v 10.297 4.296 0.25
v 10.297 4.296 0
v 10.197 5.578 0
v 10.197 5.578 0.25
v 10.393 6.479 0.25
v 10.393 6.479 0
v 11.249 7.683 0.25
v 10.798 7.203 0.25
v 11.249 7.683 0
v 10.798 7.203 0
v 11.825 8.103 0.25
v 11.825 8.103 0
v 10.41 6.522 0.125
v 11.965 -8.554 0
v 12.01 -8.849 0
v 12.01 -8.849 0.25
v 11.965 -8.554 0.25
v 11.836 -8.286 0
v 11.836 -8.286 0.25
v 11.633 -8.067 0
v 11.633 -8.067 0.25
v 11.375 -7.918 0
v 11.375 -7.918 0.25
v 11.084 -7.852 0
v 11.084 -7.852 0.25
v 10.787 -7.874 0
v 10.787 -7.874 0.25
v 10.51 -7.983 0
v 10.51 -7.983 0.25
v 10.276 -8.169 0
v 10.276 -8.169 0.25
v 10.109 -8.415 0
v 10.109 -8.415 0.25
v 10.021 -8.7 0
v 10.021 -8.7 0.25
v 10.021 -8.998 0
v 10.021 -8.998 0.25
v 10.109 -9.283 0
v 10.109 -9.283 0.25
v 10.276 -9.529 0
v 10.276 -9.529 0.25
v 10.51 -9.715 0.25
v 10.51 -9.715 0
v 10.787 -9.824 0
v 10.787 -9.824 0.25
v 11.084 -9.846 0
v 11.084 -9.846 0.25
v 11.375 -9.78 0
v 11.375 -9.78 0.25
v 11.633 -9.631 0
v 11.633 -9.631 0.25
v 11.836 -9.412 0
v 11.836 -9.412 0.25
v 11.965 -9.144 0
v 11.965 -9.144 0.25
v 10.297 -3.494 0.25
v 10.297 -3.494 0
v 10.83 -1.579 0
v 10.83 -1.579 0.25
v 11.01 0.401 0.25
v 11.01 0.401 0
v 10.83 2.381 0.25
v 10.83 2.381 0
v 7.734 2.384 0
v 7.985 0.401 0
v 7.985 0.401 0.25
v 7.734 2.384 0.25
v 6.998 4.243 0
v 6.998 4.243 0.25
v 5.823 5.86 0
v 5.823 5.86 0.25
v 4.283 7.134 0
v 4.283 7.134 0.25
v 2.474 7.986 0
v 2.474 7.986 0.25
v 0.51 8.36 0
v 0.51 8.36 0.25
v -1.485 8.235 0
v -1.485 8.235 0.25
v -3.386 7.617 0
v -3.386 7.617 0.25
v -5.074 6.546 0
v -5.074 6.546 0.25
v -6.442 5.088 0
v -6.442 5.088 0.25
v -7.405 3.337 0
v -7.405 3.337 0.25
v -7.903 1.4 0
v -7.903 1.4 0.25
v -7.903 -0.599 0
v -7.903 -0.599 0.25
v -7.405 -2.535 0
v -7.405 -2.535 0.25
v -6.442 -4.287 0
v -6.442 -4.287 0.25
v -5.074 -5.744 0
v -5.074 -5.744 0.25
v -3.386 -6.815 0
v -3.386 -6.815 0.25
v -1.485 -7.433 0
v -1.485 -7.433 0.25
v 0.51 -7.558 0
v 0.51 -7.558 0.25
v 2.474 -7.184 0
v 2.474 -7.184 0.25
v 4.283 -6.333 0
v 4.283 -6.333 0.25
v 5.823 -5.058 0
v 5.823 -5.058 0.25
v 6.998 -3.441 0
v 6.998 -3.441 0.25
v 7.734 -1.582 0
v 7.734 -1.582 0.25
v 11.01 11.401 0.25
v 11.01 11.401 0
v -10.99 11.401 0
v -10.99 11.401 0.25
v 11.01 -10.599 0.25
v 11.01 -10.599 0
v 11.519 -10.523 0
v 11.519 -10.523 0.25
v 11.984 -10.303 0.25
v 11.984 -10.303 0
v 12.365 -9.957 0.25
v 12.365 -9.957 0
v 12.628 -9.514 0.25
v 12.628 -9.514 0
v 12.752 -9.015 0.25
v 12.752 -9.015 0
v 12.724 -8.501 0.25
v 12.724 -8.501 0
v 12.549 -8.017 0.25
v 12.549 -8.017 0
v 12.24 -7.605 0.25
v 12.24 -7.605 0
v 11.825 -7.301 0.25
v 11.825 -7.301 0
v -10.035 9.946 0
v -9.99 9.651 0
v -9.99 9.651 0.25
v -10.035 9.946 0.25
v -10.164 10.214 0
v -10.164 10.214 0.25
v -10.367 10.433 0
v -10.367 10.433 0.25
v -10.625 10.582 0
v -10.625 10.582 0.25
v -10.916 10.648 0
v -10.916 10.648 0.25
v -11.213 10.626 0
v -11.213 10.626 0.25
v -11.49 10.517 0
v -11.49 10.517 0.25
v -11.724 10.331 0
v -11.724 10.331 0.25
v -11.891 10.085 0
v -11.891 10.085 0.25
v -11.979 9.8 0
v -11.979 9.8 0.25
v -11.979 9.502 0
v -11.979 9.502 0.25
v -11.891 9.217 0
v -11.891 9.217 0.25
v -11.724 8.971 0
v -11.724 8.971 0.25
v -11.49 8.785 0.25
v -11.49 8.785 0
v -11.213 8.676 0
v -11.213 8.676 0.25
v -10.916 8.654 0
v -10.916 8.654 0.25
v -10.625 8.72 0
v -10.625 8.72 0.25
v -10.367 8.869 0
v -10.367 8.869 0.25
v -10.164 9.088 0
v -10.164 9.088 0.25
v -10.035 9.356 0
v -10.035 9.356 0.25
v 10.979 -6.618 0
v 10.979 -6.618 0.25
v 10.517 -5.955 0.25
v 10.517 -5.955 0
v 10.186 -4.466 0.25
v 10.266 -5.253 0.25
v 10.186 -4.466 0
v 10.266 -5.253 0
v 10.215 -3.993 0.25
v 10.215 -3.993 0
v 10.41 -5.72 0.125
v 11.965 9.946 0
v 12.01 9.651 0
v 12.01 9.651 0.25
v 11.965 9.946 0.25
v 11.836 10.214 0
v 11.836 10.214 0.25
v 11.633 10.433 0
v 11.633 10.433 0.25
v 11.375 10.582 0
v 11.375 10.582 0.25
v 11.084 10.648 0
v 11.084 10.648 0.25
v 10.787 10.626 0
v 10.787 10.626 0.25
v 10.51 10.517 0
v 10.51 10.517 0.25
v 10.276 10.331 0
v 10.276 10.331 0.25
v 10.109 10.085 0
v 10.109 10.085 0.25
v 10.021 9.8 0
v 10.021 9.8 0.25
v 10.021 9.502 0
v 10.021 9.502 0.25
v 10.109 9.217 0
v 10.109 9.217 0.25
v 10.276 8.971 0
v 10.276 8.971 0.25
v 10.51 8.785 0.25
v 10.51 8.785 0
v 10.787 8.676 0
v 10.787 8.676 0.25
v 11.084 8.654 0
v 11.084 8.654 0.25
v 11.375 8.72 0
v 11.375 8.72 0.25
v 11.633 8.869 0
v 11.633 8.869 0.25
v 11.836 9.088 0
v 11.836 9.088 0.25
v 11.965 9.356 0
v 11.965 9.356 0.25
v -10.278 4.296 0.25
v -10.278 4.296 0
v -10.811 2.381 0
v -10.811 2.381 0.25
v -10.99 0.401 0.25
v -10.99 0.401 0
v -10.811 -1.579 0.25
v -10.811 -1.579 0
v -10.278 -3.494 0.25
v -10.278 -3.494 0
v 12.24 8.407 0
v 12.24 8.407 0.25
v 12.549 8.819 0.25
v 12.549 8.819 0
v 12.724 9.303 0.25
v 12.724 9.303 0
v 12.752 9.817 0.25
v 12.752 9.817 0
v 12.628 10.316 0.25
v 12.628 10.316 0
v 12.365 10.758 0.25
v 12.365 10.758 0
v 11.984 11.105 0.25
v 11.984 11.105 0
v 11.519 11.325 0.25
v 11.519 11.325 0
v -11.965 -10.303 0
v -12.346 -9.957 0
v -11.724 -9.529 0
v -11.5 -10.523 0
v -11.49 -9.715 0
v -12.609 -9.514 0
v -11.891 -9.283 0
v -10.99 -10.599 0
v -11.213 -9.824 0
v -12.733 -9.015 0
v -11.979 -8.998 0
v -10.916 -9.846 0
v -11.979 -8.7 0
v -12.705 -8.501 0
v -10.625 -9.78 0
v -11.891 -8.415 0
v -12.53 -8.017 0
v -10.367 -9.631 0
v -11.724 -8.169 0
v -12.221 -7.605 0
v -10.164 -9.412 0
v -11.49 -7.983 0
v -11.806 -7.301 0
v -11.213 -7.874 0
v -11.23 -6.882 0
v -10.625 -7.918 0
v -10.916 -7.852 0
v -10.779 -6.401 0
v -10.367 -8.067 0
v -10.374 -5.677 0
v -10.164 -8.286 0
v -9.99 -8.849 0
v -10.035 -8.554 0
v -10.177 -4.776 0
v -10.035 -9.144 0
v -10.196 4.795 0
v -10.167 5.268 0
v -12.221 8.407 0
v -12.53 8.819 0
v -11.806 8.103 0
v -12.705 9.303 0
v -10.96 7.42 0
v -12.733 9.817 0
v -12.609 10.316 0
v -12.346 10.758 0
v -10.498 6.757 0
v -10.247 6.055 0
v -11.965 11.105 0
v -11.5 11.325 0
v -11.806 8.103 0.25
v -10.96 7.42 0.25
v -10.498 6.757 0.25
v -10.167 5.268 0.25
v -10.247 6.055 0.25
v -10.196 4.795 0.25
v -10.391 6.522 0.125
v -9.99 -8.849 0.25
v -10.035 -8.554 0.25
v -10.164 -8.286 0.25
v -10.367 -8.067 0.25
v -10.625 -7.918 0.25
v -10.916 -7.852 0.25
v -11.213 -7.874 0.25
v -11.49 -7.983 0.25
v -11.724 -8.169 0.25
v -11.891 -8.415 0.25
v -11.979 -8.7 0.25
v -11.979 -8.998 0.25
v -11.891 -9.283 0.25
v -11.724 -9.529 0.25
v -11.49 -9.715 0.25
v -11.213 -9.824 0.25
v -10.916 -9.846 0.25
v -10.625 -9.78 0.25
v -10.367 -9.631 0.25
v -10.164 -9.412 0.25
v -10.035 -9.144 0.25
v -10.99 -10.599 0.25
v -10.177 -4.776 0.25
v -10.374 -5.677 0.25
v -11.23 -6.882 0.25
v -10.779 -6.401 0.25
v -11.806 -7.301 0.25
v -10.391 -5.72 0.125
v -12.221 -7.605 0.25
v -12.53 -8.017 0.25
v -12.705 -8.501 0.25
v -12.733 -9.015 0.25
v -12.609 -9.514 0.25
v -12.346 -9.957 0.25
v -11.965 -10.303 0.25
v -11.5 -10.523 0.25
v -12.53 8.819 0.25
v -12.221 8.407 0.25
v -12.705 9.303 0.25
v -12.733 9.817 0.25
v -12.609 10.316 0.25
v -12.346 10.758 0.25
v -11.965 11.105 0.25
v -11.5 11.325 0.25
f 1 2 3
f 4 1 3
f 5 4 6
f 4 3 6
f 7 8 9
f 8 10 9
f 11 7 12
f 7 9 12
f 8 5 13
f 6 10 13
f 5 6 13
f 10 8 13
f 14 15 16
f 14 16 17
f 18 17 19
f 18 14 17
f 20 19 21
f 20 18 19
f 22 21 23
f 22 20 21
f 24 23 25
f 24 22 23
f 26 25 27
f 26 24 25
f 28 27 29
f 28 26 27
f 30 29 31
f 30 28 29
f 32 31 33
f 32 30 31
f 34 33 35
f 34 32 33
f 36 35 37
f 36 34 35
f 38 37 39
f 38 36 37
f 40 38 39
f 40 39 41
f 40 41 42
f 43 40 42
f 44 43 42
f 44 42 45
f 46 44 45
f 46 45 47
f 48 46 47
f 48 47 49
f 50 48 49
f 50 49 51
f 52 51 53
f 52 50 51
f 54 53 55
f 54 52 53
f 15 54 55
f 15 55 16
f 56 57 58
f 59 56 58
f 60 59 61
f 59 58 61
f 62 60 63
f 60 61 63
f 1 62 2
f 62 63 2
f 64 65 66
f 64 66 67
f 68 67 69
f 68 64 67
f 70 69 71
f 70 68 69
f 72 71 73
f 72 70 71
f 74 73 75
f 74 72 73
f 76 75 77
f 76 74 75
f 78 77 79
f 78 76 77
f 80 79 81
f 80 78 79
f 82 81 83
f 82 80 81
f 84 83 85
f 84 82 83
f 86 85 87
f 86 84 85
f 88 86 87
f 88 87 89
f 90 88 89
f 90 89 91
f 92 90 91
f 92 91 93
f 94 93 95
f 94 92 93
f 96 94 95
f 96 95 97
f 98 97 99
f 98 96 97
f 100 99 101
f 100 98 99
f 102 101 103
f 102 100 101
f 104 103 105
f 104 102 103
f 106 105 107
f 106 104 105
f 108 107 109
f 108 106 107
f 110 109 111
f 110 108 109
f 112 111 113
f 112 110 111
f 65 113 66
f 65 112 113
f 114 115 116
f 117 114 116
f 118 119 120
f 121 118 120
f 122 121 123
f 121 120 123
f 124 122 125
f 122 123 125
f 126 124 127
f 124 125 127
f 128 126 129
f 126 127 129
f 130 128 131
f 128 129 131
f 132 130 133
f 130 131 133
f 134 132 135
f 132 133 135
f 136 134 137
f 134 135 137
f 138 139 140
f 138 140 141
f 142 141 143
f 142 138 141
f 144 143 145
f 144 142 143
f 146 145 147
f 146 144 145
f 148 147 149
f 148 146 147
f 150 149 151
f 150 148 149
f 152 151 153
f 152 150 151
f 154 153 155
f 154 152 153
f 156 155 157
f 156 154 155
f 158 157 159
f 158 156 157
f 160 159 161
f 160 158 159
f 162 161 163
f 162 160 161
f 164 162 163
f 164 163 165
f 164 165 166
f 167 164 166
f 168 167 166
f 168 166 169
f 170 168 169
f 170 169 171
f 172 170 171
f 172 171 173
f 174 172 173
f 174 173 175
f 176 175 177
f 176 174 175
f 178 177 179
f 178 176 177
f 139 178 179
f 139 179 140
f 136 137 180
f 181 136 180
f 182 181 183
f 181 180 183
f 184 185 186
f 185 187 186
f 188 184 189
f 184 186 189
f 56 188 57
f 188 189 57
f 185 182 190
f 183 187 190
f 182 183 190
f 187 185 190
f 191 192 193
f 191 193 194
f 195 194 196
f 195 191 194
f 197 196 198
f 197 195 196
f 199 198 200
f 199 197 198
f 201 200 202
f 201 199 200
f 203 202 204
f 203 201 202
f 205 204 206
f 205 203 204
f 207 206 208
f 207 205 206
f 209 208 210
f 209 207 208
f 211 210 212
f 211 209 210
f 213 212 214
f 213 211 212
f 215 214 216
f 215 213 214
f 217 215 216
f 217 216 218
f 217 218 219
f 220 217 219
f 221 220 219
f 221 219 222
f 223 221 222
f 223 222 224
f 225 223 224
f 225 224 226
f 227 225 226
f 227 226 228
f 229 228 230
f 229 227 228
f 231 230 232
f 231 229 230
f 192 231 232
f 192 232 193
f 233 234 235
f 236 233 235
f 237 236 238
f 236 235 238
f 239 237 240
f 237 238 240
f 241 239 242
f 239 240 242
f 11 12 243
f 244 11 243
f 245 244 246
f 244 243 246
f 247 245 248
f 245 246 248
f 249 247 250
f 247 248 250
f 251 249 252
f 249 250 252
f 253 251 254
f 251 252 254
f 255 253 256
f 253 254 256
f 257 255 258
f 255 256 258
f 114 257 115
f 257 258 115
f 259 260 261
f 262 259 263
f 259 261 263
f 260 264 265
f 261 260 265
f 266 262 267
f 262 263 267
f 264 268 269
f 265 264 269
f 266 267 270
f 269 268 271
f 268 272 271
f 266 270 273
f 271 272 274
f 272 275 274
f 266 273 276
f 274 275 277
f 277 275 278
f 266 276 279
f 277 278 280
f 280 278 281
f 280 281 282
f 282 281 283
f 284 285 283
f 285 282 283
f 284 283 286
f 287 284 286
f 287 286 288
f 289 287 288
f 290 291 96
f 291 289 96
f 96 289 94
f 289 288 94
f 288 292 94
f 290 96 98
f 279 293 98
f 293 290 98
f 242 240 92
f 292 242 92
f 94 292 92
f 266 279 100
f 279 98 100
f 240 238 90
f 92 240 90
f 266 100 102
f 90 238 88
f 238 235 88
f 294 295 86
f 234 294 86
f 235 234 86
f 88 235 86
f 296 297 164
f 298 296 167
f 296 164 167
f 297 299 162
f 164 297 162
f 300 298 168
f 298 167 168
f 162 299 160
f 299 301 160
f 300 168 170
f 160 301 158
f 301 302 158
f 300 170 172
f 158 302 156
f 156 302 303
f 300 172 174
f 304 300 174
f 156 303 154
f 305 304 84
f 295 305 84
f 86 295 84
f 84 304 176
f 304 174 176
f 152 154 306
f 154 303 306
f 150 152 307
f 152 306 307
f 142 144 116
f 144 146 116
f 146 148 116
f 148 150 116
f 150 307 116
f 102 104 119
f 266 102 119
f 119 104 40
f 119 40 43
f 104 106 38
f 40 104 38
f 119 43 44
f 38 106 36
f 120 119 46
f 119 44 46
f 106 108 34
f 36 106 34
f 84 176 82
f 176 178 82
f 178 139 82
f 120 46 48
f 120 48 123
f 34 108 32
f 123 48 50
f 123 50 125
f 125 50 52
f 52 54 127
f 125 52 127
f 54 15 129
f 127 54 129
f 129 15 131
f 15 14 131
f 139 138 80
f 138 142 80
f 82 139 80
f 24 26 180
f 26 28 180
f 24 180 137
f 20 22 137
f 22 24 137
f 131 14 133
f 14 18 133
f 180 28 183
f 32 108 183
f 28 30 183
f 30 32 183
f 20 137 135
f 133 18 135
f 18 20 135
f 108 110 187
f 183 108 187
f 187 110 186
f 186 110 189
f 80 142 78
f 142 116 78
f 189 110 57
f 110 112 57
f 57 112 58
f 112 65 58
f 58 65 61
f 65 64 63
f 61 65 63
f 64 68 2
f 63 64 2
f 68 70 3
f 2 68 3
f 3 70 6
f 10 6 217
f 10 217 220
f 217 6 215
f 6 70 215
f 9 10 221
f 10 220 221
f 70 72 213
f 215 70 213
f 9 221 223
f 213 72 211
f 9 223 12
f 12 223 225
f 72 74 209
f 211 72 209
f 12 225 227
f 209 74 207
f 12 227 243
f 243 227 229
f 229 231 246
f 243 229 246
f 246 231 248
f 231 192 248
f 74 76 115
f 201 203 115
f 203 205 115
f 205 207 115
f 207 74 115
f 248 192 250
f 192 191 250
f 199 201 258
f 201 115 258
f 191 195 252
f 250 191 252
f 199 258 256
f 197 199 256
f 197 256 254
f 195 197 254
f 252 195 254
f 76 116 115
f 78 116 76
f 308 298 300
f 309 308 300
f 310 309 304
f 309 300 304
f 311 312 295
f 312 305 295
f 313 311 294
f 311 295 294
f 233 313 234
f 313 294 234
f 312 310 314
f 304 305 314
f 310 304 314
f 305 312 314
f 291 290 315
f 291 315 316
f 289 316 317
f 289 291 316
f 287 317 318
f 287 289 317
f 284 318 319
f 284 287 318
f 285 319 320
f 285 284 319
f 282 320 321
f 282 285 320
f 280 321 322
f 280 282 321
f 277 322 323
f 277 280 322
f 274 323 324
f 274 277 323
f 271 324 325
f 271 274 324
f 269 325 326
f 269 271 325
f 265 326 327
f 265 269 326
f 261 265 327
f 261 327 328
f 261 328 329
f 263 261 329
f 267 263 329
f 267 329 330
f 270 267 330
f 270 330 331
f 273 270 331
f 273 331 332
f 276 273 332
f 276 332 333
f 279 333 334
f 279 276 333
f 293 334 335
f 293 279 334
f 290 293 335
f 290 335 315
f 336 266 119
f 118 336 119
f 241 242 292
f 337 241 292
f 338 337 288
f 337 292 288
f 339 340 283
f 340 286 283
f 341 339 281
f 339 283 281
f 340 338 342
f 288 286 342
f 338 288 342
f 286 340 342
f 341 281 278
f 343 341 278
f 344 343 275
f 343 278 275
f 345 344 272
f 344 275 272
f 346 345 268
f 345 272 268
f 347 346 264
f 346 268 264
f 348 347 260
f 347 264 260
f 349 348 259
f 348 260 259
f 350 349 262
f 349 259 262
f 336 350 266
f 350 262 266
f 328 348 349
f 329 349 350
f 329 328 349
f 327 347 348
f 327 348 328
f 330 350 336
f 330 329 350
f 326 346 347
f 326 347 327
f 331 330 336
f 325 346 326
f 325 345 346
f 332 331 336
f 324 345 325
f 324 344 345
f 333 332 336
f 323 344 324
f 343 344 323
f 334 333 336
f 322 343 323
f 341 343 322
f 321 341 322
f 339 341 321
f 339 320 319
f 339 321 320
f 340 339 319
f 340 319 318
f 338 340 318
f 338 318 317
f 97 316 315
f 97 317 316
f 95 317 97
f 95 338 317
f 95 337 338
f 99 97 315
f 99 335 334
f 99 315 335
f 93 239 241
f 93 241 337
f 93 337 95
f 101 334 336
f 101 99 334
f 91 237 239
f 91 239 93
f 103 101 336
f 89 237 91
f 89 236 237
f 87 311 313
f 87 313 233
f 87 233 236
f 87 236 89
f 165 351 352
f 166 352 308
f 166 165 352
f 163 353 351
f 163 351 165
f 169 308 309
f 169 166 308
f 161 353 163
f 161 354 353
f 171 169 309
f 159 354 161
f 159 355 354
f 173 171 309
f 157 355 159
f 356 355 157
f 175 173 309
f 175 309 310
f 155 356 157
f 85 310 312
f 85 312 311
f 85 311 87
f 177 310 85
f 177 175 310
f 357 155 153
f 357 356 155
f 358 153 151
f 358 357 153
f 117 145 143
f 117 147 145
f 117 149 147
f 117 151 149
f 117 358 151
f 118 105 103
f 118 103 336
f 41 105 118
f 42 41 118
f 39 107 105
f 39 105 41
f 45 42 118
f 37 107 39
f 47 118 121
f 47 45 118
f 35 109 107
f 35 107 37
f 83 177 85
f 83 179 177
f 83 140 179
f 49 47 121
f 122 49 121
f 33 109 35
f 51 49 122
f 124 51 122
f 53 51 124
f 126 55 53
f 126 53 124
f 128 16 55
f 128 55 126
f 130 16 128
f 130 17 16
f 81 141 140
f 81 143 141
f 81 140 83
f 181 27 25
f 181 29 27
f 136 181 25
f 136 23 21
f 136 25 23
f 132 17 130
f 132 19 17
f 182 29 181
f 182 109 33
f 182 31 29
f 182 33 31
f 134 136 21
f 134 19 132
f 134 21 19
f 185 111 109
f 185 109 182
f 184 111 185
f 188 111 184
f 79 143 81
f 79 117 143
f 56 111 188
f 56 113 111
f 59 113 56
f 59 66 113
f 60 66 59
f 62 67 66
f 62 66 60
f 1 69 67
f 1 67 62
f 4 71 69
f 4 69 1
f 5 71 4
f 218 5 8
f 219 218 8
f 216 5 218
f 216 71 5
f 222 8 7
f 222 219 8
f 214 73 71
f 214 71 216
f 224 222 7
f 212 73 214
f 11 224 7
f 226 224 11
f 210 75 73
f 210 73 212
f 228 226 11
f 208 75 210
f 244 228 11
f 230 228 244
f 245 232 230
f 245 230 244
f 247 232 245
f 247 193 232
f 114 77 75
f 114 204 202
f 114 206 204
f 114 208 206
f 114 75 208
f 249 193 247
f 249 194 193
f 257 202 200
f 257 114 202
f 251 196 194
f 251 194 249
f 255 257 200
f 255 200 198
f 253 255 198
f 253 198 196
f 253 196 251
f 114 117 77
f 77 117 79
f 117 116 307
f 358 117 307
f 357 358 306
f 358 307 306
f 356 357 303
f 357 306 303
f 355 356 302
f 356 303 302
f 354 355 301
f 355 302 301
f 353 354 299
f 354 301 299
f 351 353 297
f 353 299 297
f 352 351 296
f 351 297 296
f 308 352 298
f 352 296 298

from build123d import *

# Parameters (mm, degrees)
SKETCH2_R           = 1
SKETCH2_R_2         = 7.975
BOSS_EXTRUDE1_DEPTH = 0.25


with BuildPart() as part:
    # Sketch2 → Boss-Extrude1 (new body)
    with BuildSketch(Plane.XY):
        with BuildLine():
            Line((-10.99049083, -10.599113396), (11.00950917, -10.599113396))
            ThreePointArc((11.00950917, -10.599113396), (12.70835196, -9.26915289), (11.825030389, -7.300751312))
            add(Edge.make_bspline(
                [(11.825030389, -7.300751312), (9.759593251, -6.043315053), (10.296923436, -3.493867271)],
                knots=[0, 0, 0, 1, 1, 1], degree=2))
            ThreePointArc((10.296923436, -3.493867271), (11.009509171, 0.400886603), (10.296923436, 4.295640477))
            add(Edge.make_bspline(
                [(10.296923436, 4.295640477), (9.75959325, 6.845088261), (11.825030389, 8.102524521)],
                knots=[0, 0, 0, 1, 1, 1], degree=2))
            ThreePointArc((11.825030389, 8.102524521), (12.70835196, 10.070926099), (11.00950917, 11.400886604))
            Line((11.00950917, 11.400886604), (-10.99049083, 11.400886604))
            ThreePointArc((-10.99049083, 11.400886604), (-12.689333619, 10.070926099), (-11.806012048, 8.102524521))
            add(Edge.make_bspline(
                [(-11.806012048, 8.102524521), (-9.740574911, 6.845088262), (-10.277905095, 4.29564048)],
                knots=[0, 0, 0, 1, 1, 1], degree=2))
            ThreePointArc((-10.277905095, 4.29564048), (-10.99049083, 0.400886606), (-10.277905095, -3.493867268))
            add(Edge.make_bspline(
                [(-10.277905095, -3.493867268), (-9.740574909, -6.043315053), (-11.806012048, -7.300751312)],
                knots=[0, 0, 0, 1, 1, 1], degree=2))
            ThreePointArc((-11.806012048, -7.300751312), (-12.689333619, -9.26915289), (-10.99049083, -10.599113396))
        make_face()
        with Locations((11.00950917, 9.650886604)):
            Circle(SKETCH2_R, mode=Mode.SUBTRACT)
        with Locations((-10.99049083, 9.650886604)):
            Circle(SKETCH2_R, mode=Mode.SUBTRACT)
        with Locations((11.00950917, -8.849113396)):
            Circle(SKETCH2_R, mode=Mode.SUBTRACT)
        with Locations((-10.99049083, -8.849113396)):
            Circle(SKETCH2_R, mode=Mode.SUBTRACT)
        with Locations((0.00950917, 0.400886604)):
            Circle(SKETCH2_R_2, mode=Mode.SUBTRACT)
    extrude(amount=BOSS_EXTRUDE1_DEPTH)


solid = part.part
